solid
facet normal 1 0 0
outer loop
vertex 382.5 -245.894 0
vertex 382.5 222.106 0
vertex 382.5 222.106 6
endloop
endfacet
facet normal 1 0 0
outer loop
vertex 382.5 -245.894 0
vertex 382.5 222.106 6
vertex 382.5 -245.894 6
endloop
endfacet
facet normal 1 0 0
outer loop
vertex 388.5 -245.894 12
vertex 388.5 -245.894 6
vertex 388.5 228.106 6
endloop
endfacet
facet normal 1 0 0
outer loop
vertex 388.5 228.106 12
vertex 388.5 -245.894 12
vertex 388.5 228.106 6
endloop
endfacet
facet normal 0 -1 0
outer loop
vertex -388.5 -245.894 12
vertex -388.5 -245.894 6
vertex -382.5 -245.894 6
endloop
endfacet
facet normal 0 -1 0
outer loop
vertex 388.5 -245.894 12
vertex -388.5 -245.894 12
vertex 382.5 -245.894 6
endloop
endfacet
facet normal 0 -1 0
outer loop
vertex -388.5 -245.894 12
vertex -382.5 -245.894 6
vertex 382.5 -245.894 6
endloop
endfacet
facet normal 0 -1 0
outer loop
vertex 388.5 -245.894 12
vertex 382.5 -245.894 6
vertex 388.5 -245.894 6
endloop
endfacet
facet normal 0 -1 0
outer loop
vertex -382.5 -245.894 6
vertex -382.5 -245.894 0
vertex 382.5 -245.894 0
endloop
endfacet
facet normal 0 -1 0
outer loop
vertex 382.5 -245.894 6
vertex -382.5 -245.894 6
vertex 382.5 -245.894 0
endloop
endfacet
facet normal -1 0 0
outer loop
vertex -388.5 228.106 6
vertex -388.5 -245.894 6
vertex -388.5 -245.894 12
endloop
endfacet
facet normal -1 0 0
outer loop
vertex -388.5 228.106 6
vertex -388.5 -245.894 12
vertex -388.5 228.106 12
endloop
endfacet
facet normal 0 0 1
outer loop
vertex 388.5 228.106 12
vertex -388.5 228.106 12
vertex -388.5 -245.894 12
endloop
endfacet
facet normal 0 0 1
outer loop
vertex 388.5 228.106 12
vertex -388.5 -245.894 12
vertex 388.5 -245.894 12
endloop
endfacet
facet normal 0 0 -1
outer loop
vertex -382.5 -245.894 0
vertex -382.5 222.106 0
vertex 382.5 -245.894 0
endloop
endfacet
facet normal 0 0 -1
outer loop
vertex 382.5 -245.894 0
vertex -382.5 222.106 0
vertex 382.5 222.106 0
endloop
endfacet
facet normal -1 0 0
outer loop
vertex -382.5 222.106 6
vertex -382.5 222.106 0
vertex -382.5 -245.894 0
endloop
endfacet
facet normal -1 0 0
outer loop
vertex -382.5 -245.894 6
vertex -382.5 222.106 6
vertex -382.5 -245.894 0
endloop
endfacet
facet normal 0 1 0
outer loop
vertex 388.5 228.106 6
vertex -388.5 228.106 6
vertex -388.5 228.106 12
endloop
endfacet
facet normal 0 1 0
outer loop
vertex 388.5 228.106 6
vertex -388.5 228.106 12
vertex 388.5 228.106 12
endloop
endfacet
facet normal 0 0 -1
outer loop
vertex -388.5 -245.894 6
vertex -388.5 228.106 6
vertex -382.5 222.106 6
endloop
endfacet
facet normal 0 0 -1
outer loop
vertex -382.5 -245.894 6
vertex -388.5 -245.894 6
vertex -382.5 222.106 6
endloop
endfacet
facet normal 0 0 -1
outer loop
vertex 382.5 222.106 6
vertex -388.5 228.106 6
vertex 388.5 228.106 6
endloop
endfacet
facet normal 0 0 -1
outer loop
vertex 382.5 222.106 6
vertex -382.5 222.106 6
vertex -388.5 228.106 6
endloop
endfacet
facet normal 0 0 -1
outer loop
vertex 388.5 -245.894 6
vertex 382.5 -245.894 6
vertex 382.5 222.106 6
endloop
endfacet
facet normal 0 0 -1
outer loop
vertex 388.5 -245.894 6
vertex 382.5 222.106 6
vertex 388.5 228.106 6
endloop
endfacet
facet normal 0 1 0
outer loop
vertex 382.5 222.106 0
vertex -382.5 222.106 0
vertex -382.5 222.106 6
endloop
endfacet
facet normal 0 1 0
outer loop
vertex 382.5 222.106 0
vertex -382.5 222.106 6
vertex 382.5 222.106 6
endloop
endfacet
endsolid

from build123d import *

# Parameters (mm, degrees)
F0_W     = 777
F0_H     = 474
F1_DEPTH = 12
F2_W     = 6
F2_H     = 474
F3_DEPTH = 6
F4_W     = 6
F4_H     = 474
F5_DEPTH = 6
F6_W     = 765
F6_H     = 6
F7_DEPTH = 6


with BuildPart() as f1:
    # F0 (on Top) → F1 (new body)
    with BuildSketch(Plane.XY):
        with Locations((0, -8.894133)):
            Rectangle(F0_W, F0_H)
    extrude(amount=F1_DEPTH)

    # F2 (on face) → F3 (cut)
    with BuildSketch(Plane(origin=(0, 0, 0), x_dir=(1, 0, 0), z_dir=(0, 0, -1))):
        with Locations((-385.5, 8.894133)):
            Rectangle(F2_W, F2_H)
    extrude(amount=-F3_DEPTH, mode=Mode.SUBTRACT)

    # F4 (on face) → F5 (cut)
    with BuildSketch(Plane(origin=(0, 0, 0), x_dir=(1, 0, 0), z_dir=(0, 0, -1))):
        with Locations((385.5, 8.894133)):
            Rectangle(F4_W, F4_H)
    extrude(amount=-F5_DEPTH, mode=Mode.SUBTRACT)

    # F6 (on face) → F7 (cut)
    with BuildSketch(Plane(origin=(0, 0, 0), x_dir=(1, 0, 0), z_dir=(0, 0, -1))):
        with Locations((0, -225.105867)):
            Rectangle(F6_W, F6_H)
    extrude(amount=-F7_DEPTH, mode=Mode.SUBTRACT)


solid = f1.part
